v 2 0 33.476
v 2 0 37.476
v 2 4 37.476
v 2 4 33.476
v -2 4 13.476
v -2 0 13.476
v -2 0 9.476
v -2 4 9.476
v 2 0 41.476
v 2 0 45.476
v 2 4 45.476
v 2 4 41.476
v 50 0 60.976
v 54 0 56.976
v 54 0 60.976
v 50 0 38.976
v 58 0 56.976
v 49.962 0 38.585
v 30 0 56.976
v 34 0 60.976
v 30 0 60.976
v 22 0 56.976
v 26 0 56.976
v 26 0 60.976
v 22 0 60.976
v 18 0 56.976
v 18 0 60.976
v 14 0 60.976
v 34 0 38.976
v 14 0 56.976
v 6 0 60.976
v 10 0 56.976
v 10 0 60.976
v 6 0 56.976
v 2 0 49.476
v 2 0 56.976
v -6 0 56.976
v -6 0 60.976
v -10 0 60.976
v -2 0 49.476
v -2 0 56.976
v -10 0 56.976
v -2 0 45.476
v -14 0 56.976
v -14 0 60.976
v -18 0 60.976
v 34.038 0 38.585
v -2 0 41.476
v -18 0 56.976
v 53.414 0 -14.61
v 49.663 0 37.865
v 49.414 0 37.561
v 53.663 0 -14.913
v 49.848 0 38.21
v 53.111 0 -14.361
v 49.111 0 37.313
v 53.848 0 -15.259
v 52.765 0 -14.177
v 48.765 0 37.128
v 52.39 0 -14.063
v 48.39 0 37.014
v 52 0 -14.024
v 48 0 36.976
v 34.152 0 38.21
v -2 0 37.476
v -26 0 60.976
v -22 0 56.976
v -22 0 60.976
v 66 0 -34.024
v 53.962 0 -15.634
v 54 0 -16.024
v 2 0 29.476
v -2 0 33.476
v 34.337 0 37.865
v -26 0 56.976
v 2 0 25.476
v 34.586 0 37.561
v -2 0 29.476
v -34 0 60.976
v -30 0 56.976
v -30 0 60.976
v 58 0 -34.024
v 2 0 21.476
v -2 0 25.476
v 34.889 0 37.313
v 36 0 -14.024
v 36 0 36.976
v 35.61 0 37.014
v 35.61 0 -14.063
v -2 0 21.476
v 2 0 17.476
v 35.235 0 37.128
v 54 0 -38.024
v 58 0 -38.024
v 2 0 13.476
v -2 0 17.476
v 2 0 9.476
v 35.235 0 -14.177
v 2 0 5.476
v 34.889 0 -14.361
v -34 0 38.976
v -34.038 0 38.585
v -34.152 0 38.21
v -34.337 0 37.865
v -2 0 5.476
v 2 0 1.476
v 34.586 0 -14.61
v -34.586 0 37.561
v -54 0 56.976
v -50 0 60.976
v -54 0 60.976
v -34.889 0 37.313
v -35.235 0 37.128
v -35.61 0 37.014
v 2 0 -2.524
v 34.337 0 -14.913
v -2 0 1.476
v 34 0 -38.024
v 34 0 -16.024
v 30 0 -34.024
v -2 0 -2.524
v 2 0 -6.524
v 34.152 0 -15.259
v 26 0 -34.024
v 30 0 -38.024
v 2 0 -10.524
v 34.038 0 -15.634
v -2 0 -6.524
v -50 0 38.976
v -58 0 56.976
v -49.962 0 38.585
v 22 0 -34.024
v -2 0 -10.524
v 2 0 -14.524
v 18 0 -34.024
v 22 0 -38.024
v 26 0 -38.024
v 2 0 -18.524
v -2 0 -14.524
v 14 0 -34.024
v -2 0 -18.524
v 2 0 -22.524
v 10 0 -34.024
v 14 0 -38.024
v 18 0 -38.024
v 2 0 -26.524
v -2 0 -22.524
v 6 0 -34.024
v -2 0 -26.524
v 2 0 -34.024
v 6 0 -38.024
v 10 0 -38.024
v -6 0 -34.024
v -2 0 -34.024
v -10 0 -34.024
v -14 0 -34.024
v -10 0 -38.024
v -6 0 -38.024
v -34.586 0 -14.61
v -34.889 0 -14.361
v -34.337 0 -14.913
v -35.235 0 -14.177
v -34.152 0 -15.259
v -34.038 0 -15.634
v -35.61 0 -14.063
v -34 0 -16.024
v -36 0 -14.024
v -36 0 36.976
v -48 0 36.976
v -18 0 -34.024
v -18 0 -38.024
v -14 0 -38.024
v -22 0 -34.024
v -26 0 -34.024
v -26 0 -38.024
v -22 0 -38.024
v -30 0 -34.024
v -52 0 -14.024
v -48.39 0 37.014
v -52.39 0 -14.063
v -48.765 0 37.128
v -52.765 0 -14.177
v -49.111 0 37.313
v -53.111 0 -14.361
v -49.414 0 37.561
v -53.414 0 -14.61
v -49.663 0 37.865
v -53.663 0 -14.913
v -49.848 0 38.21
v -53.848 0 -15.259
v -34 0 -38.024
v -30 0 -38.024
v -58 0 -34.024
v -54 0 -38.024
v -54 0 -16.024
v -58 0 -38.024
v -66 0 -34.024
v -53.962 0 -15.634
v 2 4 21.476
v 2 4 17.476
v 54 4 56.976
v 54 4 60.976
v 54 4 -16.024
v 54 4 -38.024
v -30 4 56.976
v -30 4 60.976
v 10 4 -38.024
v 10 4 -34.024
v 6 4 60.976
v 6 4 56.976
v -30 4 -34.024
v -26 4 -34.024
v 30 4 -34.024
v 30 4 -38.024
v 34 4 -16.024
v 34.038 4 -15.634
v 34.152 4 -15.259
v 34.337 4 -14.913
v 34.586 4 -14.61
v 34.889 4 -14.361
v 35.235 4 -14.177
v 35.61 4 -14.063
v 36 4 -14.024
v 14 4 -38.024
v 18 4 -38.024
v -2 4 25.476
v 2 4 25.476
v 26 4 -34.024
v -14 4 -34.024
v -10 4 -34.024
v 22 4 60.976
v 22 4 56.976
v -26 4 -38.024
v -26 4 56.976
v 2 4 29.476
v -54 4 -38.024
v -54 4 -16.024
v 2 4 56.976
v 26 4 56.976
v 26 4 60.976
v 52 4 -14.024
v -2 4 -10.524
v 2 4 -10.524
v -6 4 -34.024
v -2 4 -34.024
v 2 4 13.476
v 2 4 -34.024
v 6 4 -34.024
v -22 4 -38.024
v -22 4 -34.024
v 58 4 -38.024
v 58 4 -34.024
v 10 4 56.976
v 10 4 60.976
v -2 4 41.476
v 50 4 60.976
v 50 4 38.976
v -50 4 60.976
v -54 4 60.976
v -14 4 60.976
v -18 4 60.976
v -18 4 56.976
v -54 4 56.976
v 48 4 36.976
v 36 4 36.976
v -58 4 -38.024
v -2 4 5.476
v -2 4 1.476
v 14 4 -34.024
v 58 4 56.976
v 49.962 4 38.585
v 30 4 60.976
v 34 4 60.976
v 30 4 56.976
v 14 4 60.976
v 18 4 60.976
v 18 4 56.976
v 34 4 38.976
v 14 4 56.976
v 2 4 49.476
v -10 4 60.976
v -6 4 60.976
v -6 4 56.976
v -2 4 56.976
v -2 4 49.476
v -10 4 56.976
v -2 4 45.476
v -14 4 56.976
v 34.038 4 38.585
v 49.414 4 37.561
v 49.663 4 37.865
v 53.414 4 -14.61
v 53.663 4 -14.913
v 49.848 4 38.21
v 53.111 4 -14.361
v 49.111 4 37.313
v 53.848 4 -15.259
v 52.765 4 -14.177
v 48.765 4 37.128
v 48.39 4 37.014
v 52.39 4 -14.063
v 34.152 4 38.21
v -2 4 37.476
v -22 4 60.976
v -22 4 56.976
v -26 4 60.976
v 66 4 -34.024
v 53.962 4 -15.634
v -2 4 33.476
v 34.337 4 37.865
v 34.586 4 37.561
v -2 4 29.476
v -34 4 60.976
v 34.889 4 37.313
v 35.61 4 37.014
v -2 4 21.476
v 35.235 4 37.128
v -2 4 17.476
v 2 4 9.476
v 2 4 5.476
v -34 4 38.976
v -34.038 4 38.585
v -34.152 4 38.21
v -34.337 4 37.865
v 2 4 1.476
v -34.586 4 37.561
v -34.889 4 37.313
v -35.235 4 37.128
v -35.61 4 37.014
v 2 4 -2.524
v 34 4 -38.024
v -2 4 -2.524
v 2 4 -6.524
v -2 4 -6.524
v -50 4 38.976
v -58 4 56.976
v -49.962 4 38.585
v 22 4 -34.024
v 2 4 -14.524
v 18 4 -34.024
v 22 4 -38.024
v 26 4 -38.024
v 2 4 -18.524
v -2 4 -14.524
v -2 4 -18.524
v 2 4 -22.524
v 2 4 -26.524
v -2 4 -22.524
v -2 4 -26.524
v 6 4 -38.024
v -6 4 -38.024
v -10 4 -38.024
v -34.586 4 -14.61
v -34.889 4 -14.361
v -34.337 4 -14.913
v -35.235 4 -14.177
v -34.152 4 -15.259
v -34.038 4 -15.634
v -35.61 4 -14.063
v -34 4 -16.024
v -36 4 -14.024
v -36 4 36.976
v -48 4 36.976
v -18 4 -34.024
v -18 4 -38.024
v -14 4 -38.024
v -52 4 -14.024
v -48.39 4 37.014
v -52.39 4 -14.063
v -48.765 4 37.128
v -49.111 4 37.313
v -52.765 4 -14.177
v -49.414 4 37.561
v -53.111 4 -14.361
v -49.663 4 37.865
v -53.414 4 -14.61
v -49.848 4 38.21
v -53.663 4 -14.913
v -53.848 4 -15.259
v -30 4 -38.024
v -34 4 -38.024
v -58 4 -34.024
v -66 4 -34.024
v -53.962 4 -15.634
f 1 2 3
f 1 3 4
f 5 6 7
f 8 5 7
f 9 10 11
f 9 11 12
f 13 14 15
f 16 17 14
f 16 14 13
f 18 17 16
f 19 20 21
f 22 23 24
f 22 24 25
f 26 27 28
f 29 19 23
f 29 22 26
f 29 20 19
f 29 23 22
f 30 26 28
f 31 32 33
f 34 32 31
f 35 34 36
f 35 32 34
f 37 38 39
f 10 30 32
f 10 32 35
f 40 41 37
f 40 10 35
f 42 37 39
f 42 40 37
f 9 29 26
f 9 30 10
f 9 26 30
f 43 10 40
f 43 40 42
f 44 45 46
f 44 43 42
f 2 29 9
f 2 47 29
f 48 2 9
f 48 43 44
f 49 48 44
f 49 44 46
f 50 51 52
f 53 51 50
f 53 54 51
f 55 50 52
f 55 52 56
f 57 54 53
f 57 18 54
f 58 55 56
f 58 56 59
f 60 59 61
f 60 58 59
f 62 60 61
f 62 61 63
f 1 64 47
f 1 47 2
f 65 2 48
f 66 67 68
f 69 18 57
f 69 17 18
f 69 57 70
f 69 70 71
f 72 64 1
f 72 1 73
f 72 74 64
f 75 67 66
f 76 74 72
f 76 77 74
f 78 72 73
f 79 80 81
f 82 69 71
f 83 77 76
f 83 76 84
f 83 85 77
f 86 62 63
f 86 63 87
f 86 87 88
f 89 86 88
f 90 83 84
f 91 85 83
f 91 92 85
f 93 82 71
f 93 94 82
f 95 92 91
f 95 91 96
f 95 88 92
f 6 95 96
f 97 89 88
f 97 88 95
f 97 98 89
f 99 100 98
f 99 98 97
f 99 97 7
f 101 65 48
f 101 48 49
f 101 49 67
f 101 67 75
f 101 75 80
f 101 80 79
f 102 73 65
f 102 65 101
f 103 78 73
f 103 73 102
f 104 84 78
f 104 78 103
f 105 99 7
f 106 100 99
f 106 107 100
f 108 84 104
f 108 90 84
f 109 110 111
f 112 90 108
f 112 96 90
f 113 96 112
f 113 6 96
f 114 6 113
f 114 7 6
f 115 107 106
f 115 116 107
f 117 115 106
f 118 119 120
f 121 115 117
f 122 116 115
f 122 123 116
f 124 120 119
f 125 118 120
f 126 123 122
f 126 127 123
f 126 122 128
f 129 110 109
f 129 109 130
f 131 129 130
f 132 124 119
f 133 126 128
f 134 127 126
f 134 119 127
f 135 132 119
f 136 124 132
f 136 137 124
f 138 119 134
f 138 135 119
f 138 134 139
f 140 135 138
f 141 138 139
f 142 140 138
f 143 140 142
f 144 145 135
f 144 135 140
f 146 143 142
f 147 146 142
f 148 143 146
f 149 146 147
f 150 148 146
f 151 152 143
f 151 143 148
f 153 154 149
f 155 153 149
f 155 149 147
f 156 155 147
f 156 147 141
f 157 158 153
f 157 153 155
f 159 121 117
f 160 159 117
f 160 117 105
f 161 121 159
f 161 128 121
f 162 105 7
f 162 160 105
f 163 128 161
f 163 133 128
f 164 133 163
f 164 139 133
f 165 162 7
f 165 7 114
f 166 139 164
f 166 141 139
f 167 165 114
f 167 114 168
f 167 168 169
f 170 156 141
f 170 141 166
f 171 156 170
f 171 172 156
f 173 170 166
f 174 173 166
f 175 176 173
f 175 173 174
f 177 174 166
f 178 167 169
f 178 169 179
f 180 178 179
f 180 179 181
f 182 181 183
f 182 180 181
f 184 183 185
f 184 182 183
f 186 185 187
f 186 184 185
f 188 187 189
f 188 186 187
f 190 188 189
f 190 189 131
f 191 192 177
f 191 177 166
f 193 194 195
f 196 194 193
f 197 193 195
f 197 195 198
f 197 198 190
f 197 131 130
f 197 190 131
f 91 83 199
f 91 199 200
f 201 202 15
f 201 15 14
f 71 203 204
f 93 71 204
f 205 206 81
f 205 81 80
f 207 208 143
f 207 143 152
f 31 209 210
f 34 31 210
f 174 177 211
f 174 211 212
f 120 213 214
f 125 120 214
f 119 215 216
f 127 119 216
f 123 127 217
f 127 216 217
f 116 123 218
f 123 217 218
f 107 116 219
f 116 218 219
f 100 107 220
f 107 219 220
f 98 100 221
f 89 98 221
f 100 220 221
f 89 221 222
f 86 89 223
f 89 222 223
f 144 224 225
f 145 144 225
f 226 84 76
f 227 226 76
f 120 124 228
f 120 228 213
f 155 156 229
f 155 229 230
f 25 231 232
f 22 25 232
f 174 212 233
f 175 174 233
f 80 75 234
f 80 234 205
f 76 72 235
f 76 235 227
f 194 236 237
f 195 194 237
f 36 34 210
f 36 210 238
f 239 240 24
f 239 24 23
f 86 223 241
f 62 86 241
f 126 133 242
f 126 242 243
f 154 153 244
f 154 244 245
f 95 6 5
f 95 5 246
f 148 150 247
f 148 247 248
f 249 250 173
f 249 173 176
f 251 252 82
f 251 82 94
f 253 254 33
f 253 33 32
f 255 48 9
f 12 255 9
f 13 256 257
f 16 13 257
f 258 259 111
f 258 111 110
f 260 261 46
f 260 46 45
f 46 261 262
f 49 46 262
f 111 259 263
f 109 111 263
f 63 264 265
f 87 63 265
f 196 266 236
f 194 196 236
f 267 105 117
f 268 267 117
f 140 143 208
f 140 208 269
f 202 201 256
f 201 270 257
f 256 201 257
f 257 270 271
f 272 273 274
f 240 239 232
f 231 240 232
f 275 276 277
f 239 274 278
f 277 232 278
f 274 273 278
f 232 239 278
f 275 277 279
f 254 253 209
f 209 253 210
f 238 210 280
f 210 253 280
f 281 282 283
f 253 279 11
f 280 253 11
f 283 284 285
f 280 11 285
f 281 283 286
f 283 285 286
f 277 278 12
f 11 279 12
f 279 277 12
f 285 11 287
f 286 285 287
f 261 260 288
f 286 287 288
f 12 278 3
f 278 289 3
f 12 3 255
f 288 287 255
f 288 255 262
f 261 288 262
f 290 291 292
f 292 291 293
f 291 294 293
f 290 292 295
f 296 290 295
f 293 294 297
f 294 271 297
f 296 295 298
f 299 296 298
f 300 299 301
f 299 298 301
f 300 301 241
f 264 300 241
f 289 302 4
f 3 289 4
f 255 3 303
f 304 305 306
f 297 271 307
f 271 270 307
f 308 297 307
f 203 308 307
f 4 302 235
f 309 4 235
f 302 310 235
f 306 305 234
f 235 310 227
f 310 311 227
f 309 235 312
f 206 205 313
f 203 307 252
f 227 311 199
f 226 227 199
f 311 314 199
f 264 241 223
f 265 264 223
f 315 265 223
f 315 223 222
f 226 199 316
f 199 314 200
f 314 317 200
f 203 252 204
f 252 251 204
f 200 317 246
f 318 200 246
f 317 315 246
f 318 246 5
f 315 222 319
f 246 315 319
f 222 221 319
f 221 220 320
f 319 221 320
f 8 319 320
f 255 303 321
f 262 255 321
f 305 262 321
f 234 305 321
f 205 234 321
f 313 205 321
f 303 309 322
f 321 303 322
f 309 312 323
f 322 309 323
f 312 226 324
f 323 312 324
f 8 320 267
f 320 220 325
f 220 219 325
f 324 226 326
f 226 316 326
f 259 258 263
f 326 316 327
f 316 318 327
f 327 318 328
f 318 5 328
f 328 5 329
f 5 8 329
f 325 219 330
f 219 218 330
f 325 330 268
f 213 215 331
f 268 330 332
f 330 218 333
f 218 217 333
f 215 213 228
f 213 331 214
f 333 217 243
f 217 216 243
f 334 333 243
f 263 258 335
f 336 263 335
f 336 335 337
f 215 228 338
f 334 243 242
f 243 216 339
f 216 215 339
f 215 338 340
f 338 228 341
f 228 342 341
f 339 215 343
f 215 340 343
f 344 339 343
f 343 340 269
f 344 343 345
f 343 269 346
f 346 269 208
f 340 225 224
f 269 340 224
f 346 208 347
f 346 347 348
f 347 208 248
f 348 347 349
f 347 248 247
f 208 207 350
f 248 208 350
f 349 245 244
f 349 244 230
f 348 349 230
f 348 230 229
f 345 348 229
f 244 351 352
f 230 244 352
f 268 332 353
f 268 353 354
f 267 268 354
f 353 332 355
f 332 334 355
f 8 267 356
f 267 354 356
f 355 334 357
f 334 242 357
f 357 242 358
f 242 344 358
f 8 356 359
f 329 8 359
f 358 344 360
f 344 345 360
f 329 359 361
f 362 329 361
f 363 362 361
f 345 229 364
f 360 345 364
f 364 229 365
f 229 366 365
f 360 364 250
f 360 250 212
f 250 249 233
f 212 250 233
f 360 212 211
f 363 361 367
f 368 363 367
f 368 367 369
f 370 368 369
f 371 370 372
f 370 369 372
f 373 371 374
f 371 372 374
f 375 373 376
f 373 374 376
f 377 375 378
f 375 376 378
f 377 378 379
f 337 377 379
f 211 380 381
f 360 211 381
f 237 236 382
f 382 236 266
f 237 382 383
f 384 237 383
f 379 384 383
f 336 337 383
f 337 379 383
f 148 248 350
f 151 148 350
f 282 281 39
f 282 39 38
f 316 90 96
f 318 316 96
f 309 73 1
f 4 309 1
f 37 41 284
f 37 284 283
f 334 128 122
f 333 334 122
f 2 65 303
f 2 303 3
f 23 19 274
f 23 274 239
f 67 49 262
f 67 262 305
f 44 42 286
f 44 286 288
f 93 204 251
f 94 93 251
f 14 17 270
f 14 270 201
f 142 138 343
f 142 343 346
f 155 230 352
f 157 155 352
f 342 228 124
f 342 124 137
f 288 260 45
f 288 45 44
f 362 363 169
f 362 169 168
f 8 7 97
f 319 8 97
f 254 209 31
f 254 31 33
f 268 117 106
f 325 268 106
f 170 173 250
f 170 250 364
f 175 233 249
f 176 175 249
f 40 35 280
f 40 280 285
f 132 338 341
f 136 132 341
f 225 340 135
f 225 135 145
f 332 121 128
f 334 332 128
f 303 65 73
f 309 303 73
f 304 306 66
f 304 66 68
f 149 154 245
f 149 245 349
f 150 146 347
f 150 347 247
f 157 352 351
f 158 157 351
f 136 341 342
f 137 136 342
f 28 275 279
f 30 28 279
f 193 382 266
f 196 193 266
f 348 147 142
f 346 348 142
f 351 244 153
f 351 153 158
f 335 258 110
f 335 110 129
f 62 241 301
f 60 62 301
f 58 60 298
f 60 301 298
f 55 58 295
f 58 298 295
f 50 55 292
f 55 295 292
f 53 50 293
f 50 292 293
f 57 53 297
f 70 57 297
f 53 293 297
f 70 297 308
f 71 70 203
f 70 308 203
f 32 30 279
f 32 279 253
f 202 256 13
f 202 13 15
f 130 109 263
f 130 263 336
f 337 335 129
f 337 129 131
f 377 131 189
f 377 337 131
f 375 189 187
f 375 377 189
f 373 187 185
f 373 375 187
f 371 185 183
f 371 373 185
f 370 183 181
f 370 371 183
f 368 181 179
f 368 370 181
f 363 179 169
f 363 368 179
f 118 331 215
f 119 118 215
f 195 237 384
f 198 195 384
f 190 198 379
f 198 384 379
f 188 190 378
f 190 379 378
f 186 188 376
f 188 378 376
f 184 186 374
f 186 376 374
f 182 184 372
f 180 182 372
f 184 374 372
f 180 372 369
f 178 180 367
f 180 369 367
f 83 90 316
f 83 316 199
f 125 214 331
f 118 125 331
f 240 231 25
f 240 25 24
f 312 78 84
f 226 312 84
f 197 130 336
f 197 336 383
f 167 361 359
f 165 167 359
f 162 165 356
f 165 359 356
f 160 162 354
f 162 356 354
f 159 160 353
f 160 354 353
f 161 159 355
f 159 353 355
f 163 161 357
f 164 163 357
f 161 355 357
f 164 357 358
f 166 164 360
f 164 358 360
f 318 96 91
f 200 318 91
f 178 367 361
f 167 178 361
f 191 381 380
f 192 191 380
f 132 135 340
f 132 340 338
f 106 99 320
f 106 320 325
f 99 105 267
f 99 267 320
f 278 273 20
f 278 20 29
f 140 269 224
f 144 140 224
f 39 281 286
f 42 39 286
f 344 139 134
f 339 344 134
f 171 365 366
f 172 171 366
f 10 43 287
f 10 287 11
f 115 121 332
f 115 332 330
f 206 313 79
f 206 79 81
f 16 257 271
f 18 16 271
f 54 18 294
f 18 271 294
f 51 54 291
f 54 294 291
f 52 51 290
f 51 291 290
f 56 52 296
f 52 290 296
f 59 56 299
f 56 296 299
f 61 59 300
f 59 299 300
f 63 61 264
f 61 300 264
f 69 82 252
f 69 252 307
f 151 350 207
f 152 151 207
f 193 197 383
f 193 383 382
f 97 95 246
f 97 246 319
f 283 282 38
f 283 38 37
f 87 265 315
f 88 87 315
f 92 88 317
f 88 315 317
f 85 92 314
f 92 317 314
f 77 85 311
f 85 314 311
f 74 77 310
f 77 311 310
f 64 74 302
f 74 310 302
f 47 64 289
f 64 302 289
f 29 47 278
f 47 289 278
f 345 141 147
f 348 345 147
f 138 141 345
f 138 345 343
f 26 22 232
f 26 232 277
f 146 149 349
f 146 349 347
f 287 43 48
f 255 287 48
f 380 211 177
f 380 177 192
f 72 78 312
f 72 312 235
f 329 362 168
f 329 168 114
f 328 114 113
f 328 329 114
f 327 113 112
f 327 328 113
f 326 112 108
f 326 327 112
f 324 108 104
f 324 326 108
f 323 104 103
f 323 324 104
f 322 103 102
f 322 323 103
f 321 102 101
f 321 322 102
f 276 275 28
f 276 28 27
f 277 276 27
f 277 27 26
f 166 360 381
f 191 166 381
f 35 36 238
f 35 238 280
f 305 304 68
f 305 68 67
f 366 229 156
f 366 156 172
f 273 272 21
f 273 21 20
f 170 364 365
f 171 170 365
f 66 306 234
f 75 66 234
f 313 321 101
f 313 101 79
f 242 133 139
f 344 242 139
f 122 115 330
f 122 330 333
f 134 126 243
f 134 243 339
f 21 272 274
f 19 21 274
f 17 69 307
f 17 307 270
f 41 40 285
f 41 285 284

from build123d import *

# Parameters (mm, degrees)
SKETCH1_W           = 4
SKETCH1_H           = 4
BOSS_EXTRUDE1_DEPTH = 4
SKETCH2_W           = 4
SKETCH2_H           = 4
BOSS_EXTRUDE2_DEPTH = 4
CUT_EXTRUDE2_DEPTH  = 4


with BuildPart() as part:
    # Sketch1 → Boss-Extrude1 (new body)
    with BuildSketch(Plane(origin=(0, 0, 0), x_dir=(1, 0, 0), z_dir=(0, 1, 0))):
        Polygon((-66, 34.024336283), (-2, 34.024336283), (-2, 26.524336283), (2, 26.524336283), (2, 34.024336283), (66, 34.024336283), (58, -56.975663717), (2, -56.975663717), (2, -49.475663717), (-2, -49.475663717), (-2, -56.975663717), (-58, -56.975663717), align=None)
        with Locations((0, -3.475663717)):
            Rectangle(SKETCH1_W, SKETCH1_H, mode=Mode.SUBTRACT)
        with Locations((0, -11.475663717)):
            Rectangle(SKETCH1_W, SKETCH1_H, mode=Mode.SUBTRACT)
        with Locations((0, 4.524336283)):
            Rectangle(SKETCH1_W, SKETCH1_H, mode=Mode.SUBTRACT)
        with Locations((0, 12.524336283)):
            Rectangle(SKETCH1_W, SKETCH1_H, mode=Mode.SUBTRACT)
        with Locations((0, 20.524336283)):
            Rectangle(SKETCH1_W, SKETCH1_H, mode=Mode.SUBTRACT)
        with Locations((0, -19.475663717)):
            Rectangle(SKETCH1_W, SKETCH1_H, mode=Mode.SUBTRACT)
        with Locations((0, -27.475663717)):
            Rectangle(SKETCH1_W, SKETCH1_H, mode=Mode.SUBTRACT)
        with Locations((0, -35.475663717)):
            Rectangle(SKETCH1_W, SKETCH1_H, mode=Mode.SUBTRACT)
        with Locations((0, -43.475663717)):
            Rectangle(SKETCH1_W, SKETCH1_H, mode=Mode.SUBTRACT)
    extrude(amount=BOSS_EXTRUDE1_DEPTH)

    # Sketch2 → Boss-Extrude2 (add)
    with BuildSketch(Plane(origin=(0, 4, 0), x_dir=(1, 0, 0), z_dir=(0, 1, 0))):
        with Locations((-8, 36.024336283)):
            Rectangle(SKETCH2_W, SKETCH2_H)
        with Locations((-16, 36.024336283)):
            Rectangle(SKETCH2_W, SKETCH2_H)
        with Locations((-24, 36.024336283)):
            Rectangle(SKETCH2_W, SKETCH2_H)
        with Locations((-32, 36.024336283)):
            Rectangle(SKETCH2_W, SKETCH2_H)
        with Locations((56, 36.024336283)):
            Rectangle(SKETCH2_W, SKETCH2_H)
        with Locations((32, 36.024336283)):
            Rectangle(SKETCH2_W, SKETCH2_H)
        with Locations((-56, 36.024336283)):
            Rectangle(SKETCH2_W, SKETCH2_H)
        with Locations((24, 36.024336283)):
            Rectangle(SKETCH2_W, SKETCH2_H)
        with Locations((16, 36.024336283)):
            Rectangle(SKETCH2_W, SKETCH2_H)
        with Locations((8, 36.024336283)):
            Rectangle(SKETCH2_W, SKETCH2_H)
        with Locations((8, -58.975663717)):
            Rectangle(SKETCH2_W, SKETCH2_H)
        with Locations((16, -58.975663717)):
            Rectangle(SKETCH2_W, SKETCH2_H)
        with Locations((24, -58.975663717)):
            Rectangle(SKETCH2_W, SKETCH2_H)
        with Locations((32, -58.975663717)):
            Rectangle(SKETCH2_W, SKETCH2_H)
        with Locations((-52, -58.975663717)):
            Rectangle(SKETCH2_W, SKETCH2_H)
        with Locations((52, -58.975663717)):
            Rectangle(SKETCH2_W, SKETCH2_H)
        with Locations((-32, -58.975663717)):
            Rectangle(SKETCH2_W, SKETCH2_H)
        with Locations((-24, -58.975663717)):
            Rectangle(SKETCH2_W, SKETCH2_H)
        with Locations((-16, -58.975663717)):
            Rectangle(SKETCH2_W, SKETCH2_H)
        with Locations((-8, -58.975663717)):
            Rectangle(SKETCH2_W, SKETCH2_H)
    extrude(amount=-BOSS_EXTRUDE2_DEPTH)

    # Sketch3 → Cut-Extrude2 (cut)
    with BuildSketch(Plane(origin=(0, 4, 0), x_dir=(1, 0, 0), z_dir=(0, 1, 0))):
        with BuildLine():
            Line((-54, 34.024336283), (-54, 16.024336283))
            ThreePointArc((-54, 16.024336283), (-53.414213562, 14.610122721), (-52, 14.024336283))
            Line((-52, 14.024336283), (-36, 14.024336283))
            ThreePointArc((-36, 14.024336283), (-34.585786438, 14.610122721), (-34, 16.024336283))
            Line((-34, 16.024336283), (-34, 34.024336283))
            Line((-34, 34.024336283), (-54, 34.024336283))
        make_face()
        with BuildLine():
            Line((54, 34.024336283), (34, 34.024336283))
            Line((34, 34.024336283), (34, 16.024336283))
            ThreePointArc((34, 16.024336283), (34.585786438, 14.610122721), (36, 14.024336283))
            Line((36, 14.024336283), (52, 14.024336283))
            ThreePointArc((52, 14.024336283), (53.414213562, 14.610122721), (54, 16.024336283))
            Line((54, 16.024336283), (54, 34.024336283))
        make_face()
        with BuildLine():
            Line((-34, -56.975663717), (-50, -56.975663717))
            Line((-50, -56.975663717), (-50, -38.975663717))
            ThreePointArc((-50, -38.975663717), (-49.414213562, -37.561450154), (-48, -36.975663717))
            Line((-48, -36.975663717), (-36, -36.975663717))
            ThreePointArc((-36, -36.975663717), (-34.585786438, -37.561450154), (-34, -38.975663717))
            Line((-34, -38.975663717), (-34, -56.975663717))
        make_face()
        with BuildLine():
            Line((34, -56.975663717), (50, -56.975663717))
            Line((50, -56.975663717), (50, -38.975663717))
            ThreePointArc((50, -38.975663717), (49.414213562, -37.561450154), (48, -36.975663717))
            Line((48, -36.975663717), (36, -36.975663717))
            ThreePointArc((36, -36.975663717), (34.585786438, -37.561450154), (34, -38.975663717))
            Line((34, -38.975663717), (34, -56.975663717))
        make_face()
    extrude(amount=-CUT_EXTRUDE2_DEPTH, mode=Mode.SUBTRACT)


solid = part.part
